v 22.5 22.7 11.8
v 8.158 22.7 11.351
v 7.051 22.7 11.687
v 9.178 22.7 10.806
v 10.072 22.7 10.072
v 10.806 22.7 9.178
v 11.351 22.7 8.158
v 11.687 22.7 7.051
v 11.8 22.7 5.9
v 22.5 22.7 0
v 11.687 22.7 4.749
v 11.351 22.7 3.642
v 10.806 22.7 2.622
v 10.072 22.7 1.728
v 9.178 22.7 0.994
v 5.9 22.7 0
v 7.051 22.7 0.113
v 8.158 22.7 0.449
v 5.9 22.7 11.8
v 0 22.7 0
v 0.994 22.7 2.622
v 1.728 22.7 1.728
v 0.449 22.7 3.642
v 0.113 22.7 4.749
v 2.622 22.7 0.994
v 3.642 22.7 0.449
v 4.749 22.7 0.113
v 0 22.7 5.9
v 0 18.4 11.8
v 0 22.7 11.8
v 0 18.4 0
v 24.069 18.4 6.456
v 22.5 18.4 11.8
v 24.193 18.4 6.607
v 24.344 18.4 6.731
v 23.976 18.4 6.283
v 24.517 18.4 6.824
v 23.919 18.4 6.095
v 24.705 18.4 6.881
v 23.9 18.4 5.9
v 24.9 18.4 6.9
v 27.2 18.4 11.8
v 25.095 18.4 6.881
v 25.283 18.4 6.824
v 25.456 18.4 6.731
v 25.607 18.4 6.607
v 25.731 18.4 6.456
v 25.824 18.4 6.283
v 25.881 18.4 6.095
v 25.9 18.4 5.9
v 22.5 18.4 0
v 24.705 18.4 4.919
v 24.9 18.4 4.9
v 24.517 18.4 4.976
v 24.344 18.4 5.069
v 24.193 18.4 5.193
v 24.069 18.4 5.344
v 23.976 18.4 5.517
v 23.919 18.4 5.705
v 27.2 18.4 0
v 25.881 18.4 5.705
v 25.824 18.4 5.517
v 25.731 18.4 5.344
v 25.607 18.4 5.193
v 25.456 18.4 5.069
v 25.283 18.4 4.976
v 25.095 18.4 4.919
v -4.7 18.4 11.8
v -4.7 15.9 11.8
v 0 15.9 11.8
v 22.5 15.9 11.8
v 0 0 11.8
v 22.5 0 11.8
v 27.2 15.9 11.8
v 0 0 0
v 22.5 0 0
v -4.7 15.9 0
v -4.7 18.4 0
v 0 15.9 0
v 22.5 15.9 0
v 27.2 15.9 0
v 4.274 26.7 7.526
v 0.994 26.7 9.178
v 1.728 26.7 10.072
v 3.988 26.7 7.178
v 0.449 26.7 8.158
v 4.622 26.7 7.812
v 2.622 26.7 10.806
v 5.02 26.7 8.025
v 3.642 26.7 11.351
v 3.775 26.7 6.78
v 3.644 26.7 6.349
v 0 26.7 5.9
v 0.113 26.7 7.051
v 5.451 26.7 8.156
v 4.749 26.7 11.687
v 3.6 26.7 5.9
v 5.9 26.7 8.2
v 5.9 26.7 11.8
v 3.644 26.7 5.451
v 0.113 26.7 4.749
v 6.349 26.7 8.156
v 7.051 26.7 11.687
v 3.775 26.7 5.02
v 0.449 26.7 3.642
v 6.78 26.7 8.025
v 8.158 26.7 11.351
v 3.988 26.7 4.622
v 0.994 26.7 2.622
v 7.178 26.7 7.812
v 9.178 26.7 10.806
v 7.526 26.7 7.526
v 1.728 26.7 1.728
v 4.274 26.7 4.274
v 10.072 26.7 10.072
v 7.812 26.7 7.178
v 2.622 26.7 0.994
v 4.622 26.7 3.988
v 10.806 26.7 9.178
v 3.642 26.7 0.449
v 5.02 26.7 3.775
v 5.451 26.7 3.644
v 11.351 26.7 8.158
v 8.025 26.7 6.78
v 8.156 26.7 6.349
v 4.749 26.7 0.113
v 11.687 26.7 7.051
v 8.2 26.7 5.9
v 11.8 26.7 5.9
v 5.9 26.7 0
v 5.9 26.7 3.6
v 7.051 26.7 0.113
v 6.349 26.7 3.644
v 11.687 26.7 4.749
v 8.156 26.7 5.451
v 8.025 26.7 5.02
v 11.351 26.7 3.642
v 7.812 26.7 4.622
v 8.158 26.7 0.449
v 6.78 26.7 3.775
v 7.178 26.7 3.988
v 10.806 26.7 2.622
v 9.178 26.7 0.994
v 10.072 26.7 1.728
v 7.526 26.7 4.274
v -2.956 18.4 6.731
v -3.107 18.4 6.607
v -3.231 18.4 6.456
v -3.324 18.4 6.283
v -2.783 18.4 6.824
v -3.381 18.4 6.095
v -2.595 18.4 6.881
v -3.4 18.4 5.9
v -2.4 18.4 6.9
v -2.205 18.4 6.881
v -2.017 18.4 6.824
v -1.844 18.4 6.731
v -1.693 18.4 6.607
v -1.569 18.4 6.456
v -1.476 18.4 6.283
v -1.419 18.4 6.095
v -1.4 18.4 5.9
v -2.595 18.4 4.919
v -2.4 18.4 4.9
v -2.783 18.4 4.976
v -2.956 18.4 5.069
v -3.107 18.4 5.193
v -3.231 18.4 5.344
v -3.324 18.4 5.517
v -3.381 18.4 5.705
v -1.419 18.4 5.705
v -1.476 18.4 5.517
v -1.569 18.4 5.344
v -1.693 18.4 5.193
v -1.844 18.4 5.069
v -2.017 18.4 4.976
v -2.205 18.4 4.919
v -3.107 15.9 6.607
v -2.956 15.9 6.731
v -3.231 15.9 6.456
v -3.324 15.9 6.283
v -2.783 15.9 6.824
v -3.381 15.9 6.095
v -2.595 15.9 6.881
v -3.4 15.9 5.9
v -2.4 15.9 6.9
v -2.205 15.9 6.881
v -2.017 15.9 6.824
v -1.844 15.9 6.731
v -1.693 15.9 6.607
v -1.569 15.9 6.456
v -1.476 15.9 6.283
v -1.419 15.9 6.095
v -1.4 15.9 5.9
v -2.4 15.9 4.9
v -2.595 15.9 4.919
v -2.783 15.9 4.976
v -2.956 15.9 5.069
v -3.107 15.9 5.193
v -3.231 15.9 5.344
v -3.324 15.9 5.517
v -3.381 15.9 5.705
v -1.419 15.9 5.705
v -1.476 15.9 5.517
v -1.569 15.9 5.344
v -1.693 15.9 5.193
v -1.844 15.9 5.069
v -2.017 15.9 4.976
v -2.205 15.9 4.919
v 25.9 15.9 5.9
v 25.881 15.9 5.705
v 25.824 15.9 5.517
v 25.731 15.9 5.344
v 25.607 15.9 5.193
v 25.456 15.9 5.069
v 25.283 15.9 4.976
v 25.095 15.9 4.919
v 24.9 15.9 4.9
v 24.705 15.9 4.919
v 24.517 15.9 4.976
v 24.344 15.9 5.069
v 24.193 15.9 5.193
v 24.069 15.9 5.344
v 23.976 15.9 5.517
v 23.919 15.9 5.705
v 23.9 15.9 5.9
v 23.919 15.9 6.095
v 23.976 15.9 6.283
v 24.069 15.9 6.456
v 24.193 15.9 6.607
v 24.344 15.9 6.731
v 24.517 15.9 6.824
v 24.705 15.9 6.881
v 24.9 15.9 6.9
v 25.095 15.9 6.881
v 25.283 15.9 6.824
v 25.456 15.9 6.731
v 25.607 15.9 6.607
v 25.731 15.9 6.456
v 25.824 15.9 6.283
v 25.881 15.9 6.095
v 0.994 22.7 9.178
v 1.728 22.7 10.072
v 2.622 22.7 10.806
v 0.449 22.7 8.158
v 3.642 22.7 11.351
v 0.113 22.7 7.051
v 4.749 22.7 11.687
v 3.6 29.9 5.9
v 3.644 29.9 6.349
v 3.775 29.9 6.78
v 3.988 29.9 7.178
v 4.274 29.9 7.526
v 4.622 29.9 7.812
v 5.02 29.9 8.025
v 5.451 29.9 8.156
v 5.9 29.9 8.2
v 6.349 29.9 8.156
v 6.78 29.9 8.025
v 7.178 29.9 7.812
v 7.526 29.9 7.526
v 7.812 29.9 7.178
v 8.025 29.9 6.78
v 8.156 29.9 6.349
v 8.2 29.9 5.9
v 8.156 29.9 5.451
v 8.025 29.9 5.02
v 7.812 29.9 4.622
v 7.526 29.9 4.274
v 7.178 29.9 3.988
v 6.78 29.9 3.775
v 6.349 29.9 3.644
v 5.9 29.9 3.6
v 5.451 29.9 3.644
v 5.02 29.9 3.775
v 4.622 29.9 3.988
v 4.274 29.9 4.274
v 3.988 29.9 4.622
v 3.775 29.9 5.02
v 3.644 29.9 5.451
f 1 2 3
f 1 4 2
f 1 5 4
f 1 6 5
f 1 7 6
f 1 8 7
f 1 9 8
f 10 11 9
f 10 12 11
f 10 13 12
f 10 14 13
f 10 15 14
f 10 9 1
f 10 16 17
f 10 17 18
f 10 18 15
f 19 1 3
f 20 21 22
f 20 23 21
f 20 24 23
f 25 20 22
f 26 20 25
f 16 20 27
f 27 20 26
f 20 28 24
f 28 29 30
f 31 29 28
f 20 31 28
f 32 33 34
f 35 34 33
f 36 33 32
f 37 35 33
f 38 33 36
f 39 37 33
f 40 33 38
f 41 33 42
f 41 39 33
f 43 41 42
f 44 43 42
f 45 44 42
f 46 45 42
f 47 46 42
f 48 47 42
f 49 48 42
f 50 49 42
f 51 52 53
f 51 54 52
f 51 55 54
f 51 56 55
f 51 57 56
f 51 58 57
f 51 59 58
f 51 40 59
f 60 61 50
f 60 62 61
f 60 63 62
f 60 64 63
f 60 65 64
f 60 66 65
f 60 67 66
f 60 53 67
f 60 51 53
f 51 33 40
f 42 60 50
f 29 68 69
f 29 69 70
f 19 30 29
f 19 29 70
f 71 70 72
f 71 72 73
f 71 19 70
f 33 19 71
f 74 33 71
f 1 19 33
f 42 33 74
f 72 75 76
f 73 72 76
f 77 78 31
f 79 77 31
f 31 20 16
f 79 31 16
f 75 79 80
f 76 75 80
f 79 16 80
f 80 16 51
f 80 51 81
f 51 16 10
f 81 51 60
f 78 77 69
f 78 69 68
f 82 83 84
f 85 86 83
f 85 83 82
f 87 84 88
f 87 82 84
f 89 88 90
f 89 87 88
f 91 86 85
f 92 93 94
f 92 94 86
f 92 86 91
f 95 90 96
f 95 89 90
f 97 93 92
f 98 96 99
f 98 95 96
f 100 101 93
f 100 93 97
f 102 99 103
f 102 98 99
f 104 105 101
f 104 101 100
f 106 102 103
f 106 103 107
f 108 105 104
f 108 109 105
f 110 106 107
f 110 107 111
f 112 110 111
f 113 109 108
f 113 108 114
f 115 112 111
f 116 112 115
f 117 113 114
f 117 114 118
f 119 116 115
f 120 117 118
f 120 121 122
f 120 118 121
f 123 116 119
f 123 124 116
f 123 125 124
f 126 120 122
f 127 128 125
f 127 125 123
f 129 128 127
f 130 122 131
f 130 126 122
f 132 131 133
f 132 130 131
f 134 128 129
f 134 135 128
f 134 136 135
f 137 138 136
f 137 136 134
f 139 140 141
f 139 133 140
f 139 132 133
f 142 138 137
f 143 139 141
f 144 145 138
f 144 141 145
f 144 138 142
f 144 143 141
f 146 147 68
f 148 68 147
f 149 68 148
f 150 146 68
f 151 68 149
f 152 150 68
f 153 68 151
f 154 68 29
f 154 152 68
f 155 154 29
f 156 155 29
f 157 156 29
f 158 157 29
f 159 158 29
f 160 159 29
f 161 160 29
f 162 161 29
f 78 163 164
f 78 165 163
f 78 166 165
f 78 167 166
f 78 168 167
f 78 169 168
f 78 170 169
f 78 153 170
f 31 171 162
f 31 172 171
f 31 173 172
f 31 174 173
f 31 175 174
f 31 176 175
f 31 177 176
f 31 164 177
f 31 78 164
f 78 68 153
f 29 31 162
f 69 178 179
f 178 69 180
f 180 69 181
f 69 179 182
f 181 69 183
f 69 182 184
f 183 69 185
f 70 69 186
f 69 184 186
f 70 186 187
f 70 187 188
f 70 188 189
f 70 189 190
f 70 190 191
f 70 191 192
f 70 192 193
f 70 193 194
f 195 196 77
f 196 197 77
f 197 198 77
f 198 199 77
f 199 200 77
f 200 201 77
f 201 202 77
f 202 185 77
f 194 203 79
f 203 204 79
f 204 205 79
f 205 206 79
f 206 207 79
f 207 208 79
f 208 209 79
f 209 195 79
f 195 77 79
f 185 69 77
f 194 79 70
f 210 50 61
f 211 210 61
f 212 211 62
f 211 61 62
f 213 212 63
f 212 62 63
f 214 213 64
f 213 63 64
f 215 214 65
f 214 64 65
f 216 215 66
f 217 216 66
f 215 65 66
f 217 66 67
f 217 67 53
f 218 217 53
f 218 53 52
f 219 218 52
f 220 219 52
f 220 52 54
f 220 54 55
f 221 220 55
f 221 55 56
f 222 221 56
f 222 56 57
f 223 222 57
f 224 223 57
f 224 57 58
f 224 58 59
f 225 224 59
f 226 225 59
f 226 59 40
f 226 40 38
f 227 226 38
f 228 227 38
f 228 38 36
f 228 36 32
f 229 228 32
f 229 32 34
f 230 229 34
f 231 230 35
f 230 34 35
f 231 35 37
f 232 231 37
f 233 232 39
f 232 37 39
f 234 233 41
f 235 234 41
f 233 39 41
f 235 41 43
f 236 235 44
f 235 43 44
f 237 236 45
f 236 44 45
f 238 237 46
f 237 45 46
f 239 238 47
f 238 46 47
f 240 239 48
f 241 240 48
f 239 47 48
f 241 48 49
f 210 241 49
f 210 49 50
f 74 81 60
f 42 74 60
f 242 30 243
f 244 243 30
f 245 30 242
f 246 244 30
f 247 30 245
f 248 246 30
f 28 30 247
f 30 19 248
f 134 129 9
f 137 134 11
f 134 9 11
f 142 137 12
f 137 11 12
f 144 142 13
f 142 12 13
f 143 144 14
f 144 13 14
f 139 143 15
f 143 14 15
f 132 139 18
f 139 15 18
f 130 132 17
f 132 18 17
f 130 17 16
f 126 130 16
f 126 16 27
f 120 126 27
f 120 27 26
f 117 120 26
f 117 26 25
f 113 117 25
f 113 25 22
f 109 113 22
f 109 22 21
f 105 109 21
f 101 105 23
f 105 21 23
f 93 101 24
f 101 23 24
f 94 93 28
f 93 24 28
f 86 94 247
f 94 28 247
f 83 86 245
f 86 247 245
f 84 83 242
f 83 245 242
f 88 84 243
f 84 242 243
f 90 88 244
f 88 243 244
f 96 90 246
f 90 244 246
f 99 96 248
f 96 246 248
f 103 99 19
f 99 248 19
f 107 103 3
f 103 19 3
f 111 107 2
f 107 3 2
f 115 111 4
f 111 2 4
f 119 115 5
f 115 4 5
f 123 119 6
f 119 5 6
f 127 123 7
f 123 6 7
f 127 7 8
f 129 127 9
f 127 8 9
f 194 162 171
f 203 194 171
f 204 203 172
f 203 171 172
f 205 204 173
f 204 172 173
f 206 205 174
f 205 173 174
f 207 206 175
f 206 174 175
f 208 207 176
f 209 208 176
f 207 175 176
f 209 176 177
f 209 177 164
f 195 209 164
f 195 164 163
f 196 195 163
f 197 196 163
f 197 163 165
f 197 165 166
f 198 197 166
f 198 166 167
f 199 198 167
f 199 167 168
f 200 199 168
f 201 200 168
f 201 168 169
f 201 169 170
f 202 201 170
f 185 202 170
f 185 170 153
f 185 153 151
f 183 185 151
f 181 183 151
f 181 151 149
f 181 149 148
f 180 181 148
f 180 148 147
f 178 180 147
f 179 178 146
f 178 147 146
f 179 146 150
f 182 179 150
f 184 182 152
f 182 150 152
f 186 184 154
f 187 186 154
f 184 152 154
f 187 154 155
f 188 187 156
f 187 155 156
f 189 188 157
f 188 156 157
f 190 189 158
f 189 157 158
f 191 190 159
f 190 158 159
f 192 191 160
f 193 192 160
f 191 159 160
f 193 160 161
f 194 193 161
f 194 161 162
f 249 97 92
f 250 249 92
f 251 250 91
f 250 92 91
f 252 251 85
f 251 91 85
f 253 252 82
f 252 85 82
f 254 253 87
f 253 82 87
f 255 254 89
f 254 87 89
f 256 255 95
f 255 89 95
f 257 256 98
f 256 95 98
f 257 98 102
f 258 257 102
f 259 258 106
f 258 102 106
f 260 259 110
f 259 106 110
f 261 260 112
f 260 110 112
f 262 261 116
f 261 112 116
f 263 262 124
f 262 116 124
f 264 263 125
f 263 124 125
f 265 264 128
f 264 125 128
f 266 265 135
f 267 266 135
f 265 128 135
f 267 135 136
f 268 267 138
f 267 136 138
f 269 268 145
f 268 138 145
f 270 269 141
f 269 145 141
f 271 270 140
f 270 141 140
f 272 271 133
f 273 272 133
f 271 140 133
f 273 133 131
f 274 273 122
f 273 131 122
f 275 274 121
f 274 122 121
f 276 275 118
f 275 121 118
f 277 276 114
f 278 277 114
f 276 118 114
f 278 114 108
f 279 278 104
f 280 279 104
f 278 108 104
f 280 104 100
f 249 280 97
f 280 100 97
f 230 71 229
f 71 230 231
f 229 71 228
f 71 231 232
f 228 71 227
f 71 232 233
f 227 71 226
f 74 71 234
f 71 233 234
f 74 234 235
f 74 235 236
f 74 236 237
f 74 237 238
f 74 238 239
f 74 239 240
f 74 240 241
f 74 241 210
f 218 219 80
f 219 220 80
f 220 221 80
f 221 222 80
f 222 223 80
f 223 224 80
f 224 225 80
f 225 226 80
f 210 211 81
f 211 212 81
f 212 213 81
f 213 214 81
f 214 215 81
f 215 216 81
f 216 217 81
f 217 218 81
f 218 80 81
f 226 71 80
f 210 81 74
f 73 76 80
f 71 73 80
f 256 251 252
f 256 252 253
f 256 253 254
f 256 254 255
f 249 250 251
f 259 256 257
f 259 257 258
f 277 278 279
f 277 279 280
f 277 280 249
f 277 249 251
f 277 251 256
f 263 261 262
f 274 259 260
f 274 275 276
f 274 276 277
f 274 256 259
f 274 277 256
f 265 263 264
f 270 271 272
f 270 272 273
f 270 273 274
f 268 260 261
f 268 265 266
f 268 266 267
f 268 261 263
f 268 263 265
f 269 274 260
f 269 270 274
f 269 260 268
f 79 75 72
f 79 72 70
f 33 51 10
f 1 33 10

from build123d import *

# Parameters (mm, degrees)
SKETCH1_W           = 4.7
SKETCH1_H           = 2.5
SKETCH1_W_2         = 22.5
SKETCH1_H_2         = 22.7
BOSS_EXTRUDE1_DEPTH = 11.8
SKETCH3_R           = 5.9
BOSS_EXTRUDE2_DEPTH = 4
BOSS_EXTRUDE3_DEPTH = 3.2
SKETCH6_R           = 1
CUT_EXTRUDE1_DEPTH  = 10


with BuildPart() as part:
    # Sketch1 → Boss-Extrude1 (new body)
    with BuildSketch(Plane.XY):
        with Locations((24.85, 17.15)):
            Rectangle(SKETCH1_W, SKETCH1_H)
        with Locations((11.25, 11.35)):
            Rectangle(SKETCH1_W_2, SKETCH1_H_2)
        with Locations((-2.35, 17.15)):
            Rectangle(SKETCH1_W, SKETCH1_H)
    extrude(amount=BOSS_EXTRUDE1_DEPTH)

    # Sketch3 → Boss-Extrude2 (add)
    with BuildSketch(Plane(origin=(0, 22.7, 0), x_dir=(1, 0, 0), z_dir=(0, 1, 0))):
        with Locations((5.9, -5.9)):
            Circle(SKETCH3_R)
    extrude(amount=BOSS_EXTRUDE2_DEPTH)

    # Sketch5 → Boss-Extrude3 (add)
    with BuildSketch(Plane(origin=(0, 26.7, 0), x_dir=(1, 0, 0), z_dir=(0, 1, 0))):
        with BuildLine():
            ThreePointArc((8.2, -5.9), (5.9, -3.6), (3.6, -5.9))
            Line((3.6, -5.9), (8.2, -5.9))
        make_face()
        with BuildLine():
            Line((8.2, -5.9), (3.6, -5.9))
            ThreePointArc((3.6, -5.9), (5.9, -8.2), (8.2, -5.9))
        make_face()
    extrude(amount=BOSS_EXTRUDE3_DEPTH)

    # Sketch6 → Cut-Extrude1 (cut)
    with BuildSketch(Plane(origin=(0, 18.4, 0), x_dir=(1, 0, 0), z_dir=(0, 1, 0))):
        with Locations((24.9, -5.9)):
            Circle(SKETCH6_R)
        with Locations((-2.4, -5.9)):
            Circle(SKETCH6_R)
    extrude(amount=-CUT_EXTRUDE1_DEPTH, mode=Mode.SUBTRACT)


solid = part.part
